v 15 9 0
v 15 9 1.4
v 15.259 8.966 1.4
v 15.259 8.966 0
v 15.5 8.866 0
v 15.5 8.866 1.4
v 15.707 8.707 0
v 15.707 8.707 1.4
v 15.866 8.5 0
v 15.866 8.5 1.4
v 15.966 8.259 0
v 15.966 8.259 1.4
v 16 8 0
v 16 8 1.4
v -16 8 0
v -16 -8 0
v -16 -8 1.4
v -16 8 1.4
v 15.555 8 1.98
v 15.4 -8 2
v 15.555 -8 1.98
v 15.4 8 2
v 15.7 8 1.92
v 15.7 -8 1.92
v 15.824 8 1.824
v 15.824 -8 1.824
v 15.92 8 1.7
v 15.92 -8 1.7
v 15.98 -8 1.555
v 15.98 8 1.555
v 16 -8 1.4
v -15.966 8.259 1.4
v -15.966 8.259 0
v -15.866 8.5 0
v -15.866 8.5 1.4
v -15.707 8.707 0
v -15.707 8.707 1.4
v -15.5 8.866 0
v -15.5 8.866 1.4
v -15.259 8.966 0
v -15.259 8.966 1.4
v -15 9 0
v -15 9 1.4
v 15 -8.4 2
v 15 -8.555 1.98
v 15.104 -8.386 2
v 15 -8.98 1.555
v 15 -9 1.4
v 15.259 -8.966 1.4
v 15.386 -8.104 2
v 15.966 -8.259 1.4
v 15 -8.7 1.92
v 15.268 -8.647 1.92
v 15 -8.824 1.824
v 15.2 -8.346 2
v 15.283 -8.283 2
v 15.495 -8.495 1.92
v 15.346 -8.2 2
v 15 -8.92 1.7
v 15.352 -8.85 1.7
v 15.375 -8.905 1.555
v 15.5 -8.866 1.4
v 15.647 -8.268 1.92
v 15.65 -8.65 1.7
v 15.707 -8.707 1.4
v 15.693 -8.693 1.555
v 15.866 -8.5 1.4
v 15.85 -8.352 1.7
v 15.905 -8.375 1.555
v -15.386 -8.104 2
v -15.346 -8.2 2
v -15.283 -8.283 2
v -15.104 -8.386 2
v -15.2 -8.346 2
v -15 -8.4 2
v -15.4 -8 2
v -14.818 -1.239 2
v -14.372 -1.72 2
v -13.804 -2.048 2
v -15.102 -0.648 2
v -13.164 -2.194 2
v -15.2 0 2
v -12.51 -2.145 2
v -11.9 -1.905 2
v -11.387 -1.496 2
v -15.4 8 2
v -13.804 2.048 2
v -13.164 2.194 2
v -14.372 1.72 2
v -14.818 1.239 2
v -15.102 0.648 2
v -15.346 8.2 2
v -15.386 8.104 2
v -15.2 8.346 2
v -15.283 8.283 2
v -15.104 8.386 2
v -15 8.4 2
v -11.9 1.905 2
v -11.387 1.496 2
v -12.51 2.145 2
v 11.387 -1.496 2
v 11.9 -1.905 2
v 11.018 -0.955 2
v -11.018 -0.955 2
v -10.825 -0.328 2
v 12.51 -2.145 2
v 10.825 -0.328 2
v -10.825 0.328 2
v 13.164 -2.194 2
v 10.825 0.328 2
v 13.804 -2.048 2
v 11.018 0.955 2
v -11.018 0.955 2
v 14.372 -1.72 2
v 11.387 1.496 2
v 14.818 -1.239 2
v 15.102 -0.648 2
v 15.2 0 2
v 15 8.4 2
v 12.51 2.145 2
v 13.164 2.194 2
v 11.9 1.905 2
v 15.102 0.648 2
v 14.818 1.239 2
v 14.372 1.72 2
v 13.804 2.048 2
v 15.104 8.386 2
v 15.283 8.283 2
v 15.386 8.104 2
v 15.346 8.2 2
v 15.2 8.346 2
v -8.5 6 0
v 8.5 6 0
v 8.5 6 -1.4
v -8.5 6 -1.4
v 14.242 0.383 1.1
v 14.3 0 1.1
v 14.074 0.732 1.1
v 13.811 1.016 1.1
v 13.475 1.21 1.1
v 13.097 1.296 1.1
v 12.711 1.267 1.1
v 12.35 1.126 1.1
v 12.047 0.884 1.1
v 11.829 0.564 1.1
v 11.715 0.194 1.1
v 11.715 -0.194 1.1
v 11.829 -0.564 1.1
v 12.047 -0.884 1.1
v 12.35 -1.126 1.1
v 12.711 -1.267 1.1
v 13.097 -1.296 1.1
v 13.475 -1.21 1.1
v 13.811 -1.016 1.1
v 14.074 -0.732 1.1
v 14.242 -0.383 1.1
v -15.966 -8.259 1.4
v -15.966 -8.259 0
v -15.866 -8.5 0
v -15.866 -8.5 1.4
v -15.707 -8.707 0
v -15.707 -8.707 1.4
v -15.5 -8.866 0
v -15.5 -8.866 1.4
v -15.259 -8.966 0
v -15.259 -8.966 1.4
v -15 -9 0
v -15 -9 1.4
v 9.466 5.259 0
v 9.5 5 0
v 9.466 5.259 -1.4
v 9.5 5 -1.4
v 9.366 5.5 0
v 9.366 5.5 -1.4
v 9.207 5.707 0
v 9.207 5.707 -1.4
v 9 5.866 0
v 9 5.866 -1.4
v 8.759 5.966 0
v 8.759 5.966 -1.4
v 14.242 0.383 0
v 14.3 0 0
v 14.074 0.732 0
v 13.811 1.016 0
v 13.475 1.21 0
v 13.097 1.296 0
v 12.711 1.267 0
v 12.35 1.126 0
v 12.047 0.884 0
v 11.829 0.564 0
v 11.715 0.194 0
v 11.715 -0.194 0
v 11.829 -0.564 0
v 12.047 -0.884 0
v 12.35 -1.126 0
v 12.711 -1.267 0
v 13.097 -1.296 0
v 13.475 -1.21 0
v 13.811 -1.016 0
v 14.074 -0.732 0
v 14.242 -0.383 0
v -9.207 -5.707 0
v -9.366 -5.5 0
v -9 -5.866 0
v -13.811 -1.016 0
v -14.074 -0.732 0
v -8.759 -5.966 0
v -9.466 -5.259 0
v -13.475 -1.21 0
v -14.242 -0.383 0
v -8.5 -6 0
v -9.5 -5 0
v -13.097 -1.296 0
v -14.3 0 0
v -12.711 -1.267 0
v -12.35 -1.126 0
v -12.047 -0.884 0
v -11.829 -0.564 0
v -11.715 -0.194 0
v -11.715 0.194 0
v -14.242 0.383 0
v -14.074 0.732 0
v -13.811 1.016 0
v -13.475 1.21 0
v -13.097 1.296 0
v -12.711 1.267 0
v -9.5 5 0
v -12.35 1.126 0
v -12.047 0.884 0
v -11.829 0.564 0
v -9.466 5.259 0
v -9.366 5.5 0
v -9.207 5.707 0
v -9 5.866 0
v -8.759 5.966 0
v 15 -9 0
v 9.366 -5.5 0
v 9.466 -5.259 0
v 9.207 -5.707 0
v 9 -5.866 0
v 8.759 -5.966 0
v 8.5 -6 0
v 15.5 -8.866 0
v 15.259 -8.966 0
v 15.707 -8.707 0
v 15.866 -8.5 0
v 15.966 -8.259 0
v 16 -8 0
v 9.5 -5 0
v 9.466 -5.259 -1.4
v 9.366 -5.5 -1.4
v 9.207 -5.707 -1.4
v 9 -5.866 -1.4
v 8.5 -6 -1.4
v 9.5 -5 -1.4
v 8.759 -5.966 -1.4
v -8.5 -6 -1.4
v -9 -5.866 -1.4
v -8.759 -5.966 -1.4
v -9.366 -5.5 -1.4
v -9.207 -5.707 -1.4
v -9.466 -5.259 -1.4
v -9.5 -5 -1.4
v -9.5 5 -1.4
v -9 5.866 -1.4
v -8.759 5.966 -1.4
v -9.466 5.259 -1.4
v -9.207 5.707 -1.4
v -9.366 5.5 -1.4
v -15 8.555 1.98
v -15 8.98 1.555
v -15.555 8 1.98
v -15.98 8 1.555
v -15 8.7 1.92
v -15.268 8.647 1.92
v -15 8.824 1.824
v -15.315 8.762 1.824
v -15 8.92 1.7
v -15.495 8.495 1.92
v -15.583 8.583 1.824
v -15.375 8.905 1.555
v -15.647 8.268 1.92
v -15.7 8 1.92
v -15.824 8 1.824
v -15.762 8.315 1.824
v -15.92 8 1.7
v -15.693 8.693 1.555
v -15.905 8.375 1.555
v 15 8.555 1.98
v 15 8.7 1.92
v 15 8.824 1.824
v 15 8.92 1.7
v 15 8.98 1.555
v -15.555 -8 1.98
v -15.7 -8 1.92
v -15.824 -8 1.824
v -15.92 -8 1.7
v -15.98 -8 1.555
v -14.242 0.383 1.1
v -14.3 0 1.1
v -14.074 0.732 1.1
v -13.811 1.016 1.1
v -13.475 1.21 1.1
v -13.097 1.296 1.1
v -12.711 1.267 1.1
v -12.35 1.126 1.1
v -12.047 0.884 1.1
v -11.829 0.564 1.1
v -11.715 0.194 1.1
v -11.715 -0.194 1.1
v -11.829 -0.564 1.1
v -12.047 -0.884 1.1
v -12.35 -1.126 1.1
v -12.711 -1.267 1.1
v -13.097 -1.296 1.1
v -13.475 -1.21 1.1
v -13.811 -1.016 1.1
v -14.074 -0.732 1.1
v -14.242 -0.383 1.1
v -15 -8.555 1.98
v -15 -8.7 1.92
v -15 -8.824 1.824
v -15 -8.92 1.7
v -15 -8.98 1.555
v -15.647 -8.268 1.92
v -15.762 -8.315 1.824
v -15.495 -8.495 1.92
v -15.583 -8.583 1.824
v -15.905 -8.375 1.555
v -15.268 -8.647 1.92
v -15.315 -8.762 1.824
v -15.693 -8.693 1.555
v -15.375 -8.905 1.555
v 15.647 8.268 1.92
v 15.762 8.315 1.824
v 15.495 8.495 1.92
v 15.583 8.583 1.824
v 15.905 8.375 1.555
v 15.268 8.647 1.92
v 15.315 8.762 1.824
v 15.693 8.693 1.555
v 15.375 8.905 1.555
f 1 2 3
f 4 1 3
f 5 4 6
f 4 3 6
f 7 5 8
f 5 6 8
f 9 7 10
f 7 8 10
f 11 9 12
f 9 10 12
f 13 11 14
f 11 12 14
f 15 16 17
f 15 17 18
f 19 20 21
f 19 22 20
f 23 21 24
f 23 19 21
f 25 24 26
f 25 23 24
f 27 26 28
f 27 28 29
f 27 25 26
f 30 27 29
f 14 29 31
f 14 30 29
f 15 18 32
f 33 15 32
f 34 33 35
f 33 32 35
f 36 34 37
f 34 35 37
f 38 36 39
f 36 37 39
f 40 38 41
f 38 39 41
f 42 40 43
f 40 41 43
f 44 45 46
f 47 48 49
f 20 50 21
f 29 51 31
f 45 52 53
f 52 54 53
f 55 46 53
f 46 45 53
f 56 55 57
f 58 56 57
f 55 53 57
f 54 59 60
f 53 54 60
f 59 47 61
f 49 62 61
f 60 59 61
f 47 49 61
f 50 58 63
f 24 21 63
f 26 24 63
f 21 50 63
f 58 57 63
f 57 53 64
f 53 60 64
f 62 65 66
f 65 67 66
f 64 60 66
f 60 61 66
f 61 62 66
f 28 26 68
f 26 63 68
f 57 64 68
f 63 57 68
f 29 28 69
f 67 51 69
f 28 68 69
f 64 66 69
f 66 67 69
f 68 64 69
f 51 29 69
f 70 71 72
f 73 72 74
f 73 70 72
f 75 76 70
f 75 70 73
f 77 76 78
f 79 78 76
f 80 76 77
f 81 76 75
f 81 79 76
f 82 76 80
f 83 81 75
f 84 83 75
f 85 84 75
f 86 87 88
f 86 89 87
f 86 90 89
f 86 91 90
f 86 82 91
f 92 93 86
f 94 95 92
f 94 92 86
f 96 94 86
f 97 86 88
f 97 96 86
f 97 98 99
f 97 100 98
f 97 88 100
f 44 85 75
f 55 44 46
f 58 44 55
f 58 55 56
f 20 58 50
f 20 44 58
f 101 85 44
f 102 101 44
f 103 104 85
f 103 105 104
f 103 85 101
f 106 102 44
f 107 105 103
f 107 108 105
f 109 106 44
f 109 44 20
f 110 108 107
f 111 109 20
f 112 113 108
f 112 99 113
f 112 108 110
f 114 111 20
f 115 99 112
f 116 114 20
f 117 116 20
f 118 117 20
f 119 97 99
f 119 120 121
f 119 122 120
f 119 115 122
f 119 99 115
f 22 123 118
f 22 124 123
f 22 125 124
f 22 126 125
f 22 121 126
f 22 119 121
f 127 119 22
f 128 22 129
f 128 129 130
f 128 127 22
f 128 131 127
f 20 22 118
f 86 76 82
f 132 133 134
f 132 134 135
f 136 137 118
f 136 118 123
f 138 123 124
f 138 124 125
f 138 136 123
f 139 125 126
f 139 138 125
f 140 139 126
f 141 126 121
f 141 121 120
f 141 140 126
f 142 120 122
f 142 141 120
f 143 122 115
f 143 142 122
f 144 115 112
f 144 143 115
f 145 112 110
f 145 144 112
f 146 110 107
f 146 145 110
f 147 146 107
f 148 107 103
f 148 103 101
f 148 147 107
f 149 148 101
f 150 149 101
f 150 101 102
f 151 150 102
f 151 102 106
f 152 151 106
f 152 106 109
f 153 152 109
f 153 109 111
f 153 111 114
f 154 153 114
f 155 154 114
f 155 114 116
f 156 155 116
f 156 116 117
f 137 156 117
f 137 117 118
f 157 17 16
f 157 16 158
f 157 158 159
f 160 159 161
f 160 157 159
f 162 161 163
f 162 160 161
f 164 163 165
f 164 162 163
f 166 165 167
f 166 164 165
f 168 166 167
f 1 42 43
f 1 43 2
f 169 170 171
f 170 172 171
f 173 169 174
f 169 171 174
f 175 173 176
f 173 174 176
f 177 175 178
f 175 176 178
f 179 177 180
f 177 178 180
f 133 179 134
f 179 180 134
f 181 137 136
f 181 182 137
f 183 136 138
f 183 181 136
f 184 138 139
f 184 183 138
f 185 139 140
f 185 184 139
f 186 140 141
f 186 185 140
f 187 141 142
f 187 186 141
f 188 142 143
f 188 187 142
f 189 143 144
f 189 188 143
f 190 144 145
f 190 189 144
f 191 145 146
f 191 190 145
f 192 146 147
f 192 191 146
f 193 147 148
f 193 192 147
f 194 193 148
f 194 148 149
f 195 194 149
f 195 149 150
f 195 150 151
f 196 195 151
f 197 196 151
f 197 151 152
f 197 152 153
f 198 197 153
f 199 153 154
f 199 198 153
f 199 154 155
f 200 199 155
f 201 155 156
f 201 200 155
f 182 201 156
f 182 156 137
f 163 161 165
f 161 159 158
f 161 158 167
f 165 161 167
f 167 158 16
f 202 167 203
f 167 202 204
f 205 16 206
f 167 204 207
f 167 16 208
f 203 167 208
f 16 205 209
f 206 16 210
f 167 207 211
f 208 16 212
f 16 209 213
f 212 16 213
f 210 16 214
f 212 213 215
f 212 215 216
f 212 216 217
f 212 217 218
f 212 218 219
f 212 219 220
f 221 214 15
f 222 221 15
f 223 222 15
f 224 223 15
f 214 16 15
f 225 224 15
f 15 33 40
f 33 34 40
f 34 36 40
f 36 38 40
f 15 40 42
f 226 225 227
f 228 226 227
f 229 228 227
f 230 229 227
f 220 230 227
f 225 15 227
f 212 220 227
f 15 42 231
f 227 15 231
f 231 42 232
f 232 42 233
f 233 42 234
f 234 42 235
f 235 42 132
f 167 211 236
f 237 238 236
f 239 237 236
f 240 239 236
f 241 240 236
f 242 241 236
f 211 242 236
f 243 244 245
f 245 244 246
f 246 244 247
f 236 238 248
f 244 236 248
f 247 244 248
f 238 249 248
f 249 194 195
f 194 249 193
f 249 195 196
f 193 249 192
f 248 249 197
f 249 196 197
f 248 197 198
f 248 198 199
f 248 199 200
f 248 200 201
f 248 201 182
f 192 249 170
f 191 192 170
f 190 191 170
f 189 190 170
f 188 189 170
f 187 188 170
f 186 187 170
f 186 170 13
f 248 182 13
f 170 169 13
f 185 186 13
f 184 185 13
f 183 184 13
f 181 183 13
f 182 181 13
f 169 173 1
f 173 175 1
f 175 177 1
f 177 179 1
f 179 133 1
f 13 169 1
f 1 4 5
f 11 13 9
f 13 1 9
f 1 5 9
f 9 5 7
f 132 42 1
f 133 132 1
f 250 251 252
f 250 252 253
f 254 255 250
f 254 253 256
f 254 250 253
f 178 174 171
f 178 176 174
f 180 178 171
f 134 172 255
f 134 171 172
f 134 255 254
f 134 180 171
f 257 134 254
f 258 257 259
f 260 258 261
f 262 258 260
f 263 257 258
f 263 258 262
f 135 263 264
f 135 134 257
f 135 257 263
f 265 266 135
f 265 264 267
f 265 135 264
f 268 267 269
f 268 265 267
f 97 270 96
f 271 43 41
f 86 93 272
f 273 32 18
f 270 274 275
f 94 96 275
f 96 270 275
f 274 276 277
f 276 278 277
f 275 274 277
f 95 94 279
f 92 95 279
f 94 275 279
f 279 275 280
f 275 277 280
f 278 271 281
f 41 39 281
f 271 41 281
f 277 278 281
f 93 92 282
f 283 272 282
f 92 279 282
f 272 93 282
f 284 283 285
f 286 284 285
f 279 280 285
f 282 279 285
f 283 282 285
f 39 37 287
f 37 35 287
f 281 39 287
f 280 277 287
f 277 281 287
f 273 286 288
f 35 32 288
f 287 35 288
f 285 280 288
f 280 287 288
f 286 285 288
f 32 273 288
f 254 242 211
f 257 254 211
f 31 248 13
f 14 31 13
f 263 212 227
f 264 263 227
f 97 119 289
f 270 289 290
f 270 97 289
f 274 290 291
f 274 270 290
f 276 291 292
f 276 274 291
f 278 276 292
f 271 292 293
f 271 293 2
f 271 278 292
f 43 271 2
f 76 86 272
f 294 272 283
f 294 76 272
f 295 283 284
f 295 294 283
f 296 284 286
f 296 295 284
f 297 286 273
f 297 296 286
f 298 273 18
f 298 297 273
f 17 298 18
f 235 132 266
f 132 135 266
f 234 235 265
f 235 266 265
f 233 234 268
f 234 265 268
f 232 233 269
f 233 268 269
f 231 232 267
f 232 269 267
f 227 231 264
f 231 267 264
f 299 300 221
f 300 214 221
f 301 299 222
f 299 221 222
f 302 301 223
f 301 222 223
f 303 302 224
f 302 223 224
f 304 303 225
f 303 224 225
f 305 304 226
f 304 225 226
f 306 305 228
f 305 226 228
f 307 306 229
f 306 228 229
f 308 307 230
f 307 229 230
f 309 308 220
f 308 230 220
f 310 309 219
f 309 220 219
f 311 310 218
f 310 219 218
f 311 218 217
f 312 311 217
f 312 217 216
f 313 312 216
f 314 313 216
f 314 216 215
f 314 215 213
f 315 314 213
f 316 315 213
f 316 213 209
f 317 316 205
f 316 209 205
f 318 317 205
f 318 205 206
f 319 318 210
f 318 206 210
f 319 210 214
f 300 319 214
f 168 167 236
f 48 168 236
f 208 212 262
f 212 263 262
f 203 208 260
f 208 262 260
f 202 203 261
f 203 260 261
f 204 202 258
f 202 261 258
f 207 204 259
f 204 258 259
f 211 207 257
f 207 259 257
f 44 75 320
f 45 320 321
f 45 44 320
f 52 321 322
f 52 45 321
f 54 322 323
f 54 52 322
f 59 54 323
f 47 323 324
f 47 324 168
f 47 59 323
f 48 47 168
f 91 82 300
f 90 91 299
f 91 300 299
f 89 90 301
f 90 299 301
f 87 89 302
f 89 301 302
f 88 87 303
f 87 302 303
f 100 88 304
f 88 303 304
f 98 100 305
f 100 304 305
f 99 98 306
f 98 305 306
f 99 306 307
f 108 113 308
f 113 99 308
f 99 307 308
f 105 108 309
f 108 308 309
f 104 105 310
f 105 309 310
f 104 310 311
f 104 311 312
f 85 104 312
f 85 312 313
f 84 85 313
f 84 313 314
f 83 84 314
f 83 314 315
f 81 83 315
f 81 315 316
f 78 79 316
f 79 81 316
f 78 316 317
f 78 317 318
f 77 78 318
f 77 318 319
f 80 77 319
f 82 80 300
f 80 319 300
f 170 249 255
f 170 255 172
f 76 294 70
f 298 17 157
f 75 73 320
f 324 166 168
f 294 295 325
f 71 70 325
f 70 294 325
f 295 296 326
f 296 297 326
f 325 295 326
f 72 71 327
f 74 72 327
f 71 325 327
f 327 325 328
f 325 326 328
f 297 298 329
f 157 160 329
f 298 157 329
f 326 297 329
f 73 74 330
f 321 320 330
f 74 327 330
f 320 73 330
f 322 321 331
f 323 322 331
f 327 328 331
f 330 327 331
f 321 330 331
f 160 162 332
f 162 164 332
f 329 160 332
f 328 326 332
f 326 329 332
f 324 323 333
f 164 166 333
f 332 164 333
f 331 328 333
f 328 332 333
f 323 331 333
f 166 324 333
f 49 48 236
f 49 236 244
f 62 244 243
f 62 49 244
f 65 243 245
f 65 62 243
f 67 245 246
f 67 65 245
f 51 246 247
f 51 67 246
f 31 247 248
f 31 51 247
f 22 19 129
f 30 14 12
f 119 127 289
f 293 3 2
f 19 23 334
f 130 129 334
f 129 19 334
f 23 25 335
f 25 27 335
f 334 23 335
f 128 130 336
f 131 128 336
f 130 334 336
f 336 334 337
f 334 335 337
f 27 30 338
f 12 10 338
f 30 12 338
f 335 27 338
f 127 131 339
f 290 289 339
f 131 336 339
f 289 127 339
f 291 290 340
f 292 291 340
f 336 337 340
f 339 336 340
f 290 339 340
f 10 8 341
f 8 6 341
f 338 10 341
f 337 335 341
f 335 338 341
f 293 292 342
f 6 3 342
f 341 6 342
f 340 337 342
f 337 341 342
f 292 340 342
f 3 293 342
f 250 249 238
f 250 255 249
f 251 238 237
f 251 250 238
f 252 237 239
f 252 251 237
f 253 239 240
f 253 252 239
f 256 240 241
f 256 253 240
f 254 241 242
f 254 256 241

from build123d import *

# Parameters (mm, degrees)
ESQUISSE1_W                                    = 32
ESQUISSE1_H                                    = 18
BOSS_EXTRU_1_DEPTH                             = 2
ESQUISSE2_W                                    = 19
ESQUISSE2_H                                    = 12
BOSS_EXTRU_2_DEPTH                             = 1.4
CONG_1_R                                       = 1
CONG_2_R                                       = 0.6
CONG_3_R                                       = 1
FRAISAGE_POUR_VIS_T_TE_FRAIS_E_M21_D           = 2.6
FRAISAGE_POUR_VIS_T_TE_FRAIS_E_M21_CSINK_D     = 4.4
FRAISAGE_POUR_VIS_T_TE_FRAIS_E_M21_CSINK_ANGLE = 90


with BuildPart() as part:
    # Esquisse1 → Boss.-Extru.1 (new body)
    with BuildSketch(Plane.XY):
        Rectangle(ESQUISSE1_W, ESQUISSE1_H)
    extrude(amount=BOSS_EXTRU_1_DEPTH)

    # Esquisse2 → Boss.-Extru.2 (add)
    with BuildSketch(Plane(origin=(0, 0, 0), x_dir=(-1, 0, 0), z_dir=(0, 0, -1))):
        Rectangle(ESQUISSE2_W, ESQUISSE2_H)
    extrude(amount=BOSS_EXTRU_2_DEPTH)

    # Congé1
    cong_1_edges = [part.edges().sort_by_distance(p)[0] for p in [
        (16, -9, 1),
        (-16, -9, 1),
        (-16, 9, 1),
        (16, 9, 1),
    ]]
    fillet(cong_1_edges, radius=CONG_1_R)

    # Congé2
    cong_2_edges = [part.edges().sort_by_distance(p)[0] for p in [
        (16, 0, 2),
        (0, -9, 2),
        (0, 9, 2),
        (-16, 0, 2),
        (15.707106781, 8.707106781, 2),
        (-15.707106781, 8.707106781, 2),
        (-15.707106781, -8.707106781, 2),
        (15.707106781, -8.707106781, 2),
    ]]
    fillet(cong_2_edges, radius=CONG_2_R)

    # Congé3
    cong_3_edges = [part.edges().sort_by_distance(p)[0] for p in [
        (-9.5, -6, -0.7),
        (-9.5, 6, -0.7),
        (9.5, 6, -0.7),
        (9.5, -6, -0.7),
    ]]
    fillet(cong_3_edges, radius=CONG_3_R)

    # Fraisage pour vis à tête fraisée M21 (through all)
    with Locations(Plane.XY.offset(2)):
        with Locations((-13, 0)):
            fraisage_pour_vis_t_te_frais_e_m21 = CounterSinkHole(FRAISAGE_POUR_VIS_T_TE_FRAIS_E_M21_D / 2, FRAISAGE_POUR_VIS_T_TE_FRAIS_E_M21_CSINK_D / 2, counter_sink_angle=FRAISAGE_POUR_VIS_T_TE_FRAIS_E_M21_CSINK_ANGLE)

    # Symétrie1: Fraisage pour vis à tête fraisée M21 across plane
    add(fraisage_pour_vis_t_te_frais_e_m21.mirror(Plane(origin=(0, 0, 0), x_dir=(0, 0, 1), z_dir=(1, 0, 0))), mode=Mode.SUBTRACT)


solid = part.part
